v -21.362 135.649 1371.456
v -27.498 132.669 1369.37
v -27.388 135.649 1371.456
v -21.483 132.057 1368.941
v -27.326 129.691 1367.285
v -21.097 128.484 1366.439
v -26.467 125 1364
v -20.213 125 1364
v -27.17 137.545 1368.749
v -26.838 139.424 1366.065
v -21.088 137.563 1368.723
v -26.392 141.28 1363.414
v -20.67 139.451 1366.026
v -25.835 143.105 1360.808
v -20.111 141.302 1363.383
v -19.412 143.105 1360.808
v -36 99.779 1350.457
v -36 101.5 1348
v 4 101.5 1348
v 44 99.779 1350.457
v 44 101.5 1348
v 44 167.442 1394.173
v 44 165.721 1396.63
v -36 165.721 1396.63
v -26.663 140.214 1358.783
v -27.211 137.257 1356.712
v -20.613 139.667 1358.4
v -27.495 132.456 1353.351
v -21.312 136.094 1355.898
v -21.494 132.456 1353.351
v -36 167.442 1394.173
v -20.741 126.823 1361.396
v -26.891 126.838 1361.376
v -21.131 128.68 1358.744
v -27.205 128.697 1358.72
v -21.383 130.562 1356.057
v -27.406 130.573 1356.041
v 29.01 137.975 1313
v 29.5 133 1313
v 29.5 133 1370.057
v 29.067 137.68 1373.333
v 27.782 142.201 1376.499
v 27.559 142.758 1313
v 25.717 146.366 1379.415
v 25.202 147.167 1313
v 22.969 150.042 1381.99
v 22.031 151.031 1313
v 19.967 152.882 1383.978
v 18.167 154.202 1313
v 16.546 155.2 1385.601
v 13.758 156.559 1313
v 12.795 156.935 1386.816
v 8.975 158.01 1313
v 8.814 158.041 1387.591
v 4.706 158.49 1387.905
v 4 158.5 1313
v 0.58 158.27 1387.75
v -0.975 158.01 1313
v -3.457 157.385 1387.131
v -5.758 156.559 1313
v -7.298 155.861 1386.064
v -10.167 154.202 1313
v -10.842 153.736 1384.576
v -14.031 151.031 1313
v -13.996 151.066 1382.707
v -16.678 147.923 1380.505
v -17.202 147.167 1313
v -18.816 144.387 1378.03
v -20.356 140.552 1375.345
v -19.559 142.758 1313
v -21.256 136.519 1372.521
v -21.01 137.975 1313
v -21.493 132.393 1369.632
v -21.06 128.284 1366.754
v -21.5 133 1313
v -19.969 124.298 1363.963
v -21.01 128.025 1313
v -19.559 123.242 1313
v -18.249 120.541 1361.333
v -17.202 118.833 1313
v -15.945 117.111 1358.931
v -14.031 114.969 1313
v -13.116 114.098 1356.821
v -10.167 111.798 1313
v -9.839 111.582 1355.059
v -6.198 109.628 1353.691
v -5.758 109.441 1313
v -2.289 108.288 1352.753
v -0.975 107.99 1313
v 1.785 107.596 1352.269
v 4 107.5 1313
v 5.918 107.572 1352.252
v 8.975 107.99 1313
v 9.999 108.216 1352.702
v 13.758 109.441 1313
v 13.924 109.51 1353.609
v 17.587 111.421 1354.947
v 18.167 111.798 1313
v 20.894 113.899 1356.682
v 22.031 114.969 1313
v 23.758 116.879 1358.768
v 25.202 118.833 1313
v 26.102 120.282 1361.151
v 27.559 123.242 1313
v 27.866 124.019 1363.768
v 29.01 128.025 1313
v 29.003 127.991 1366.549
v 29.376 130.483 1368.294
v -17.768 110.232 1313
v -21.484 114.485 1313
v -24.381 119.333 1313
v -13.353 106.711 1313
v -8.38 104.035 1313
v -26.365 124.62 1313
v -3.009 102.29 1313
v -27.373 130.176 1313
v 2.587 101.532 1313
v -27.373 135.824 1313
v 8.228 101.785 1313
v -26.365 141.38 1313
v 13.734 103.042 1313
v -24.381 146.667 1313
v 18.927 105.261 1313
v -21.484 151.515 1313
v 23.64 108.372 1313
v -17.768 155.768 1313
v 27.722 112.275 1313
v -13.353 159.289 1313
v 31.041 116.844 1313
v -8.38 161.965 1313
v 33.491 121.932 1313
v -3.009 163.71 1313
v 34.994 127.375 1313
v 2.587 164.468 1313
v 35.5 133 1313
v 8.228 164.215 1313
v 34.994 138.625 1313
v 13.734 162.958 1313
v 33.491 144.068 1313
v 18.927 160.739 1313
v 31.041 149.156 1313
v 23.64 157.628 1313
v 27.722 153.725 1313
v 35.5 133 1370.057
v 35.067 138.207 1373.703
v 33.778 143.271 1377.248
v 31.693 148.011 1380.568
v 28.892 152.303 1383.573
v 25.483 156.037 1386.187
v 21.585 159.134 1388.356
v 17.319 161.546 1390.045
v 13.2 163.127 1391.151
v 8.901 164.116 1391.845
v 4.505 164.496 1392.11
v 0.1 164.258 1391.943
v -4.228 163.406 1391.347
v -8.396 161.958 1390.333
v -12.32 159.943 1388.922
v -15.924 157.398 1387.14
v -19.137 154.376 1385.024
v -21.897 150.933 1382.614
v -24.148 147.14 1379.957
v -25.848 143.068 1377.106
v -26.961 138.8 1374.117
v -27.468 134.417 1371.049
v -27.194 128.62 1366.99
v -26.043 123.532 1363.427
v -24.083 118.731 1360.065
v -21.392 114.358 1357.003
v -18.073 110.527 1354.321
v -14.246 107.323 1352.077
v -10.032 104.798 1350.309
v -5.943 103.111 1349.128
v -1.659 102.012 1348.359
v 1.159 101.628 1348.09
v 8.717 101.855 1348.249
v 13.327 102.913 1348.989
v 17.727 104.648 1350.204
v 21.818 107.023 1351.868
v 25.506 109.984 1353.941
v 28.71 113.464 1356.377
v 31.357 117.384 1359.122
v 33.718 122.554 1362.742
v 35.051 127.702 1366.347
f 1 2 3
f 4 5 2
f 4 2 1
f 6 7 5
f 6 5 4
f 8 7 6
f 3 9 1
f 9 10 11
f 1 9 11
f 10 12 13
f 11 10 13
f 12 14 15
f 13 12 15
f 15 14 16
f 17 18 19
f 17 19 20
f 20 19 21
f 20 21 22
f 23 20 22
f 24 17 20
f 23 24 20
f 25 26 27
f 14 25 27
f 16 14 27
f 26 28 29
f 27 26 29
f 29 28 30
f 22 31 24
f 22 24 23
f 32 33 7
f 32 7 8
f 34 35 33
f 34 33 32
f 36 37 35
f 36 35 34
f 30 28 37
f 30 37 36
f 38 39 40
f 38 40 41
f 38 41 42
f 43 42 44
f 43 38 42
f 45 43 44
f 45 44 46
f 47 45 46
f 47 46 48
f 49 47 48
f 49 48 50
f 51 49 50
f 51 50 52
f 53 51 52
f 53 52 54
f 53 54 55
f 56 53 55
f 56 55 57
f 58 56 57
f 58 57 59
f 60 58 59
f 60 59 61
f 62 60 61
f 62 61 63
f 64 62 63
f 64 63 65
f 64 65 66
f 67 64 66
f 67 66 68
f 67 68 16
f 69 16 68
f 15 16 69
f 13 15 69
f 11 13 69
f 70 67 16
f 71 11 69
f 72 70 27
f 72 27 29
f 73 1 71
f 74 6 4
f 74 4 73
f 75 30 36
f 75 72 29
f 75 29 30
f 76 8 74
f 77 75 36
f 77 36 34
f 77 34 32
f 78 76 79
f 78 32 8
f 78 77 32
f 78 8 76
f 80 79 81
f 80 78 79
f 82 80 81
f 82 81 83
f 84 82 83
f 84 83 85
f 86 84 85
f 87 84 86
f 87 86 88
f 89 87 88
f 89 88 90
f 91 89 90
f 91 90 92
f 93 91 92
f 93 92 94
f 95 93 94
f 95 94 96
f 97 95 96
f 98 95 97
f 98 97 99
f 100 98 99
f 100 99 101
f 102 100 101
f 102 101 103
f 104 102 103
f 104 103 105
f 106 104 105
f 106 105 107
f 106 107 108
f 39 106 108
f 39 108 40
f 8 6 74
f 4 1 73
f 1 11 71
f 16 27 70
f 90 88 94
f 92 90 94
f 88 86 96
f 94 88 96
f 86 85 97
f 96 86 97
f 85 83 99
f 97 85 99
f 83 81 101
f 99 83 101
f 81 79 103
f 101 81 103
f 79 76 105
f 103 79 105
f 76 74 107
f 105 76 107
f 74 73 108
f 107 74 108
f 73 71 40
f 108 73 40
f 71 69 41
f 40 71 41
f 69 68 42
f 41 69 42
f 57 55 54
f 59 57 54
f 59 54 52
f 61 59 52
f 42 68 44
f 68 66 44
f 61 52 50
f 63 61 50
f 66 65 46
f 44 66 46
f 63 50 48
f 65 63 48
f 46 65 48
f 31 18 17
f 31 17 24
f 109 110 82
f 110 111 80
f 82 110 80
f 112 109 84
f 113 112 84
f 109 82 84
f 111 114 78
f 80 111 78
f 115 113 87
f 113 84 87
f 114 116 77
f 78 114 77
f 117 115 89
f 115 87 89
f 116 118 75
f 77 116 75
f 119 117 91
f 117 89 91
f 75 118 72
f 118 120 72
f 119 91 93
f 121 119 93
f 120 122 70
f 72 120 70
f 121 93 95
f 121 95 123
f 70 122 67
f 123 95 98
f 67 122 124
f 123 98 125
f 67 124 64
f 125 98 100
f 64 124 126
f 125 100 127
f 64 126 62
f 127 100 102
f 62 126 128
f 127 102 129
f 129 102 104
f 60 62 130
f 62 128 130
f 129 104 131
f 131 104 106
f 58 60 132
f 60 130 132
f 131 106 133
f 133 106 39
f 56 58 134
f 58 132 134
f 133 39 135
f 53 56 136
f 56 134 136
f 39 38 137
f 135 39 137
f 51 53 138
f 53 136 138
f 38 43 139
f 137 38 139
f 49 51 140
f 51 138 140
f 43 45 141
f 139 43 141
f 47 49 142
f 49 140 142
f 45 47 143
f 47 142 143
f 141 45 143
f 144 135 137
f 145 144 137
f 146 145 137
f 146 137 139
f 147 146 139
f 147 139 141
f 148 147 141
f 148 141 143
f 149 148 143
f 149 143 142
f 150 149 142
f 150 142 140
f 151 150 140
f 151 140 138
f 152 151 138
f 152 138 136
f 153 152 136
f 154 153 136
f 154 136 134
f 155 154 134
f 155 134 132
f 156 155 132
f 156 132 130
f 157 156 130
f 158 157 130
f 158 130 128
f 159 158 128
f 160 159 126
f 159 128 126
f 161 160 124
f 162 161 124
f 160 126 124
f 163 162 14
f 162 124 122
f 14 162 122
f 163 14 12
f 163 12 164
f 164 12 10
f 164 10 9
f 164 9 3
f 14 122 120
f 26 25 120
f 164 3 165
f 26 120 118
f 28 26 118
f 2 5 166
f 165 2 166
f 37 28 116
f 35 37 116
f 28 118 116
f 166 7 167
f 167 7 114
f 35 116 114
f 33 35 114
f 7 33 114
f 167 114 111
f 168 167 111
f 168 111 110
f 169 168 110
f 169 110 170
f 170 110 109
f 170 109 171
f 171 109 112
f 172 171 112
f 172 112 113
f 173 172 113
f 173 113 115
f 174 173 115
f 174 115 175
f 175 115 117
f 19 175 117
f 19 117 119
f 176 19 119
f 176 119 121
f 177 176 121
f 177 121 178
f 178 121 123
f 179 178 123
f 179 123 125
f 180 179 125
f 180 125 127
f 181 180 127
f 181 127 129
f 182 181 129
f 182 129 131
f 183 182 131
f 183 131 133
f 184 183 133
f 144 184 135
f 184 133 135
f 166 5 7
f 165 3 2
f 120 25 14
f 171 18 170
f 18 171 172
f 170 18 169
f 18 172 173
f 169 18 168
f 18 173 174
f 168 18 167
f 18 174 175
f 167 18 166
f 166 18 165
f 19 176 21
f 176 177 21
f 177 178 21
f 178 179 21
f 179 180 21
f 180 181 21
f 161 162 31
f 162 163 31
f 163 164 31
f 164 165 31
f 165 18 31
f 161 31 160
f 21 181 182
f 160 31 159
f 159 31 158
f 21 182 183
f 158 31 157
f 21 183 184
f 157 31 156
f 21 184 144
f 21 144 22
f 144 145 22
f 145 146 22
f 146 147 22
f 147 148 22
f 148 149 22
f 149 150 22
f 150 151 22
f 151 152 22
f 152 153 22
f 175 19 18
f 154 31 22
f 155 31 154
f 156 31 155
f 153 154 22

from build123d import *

# Parameters (mm, degrees)
BOX059_W               = 30
BOX059_H               = 13
BOX059_DEPTH           = 13
BOX059_PLACEMENT_ANGLE = 55
BOX057_W               = 90
BOX057_H               = 40
BOX057_DEPTH           = 90
BOX057_PLACEMENT_ANGLE = 55
CYLINDER032_R          = 25.5
CYLINDER032_DEPTH      = 80
CYLINDER033_R          = 31.5
CYLINDER033_DEPTH      = 80
BOX058_W               = 80
BOX058_H               = 80.5
BOX058_DEPTH           = 3
BOX058_ROLL_ANGLE      = 35


with BuildPart() as usb_hole:
    # Box059 → Box059 (new body)
    with BuildSketch(Plane.XY):
        with Locations((15, 6.5)):
            Rectangle(BOX059_W, BOX059_H)
    extrude(amount=BOX059_DEPTH)


with BuildPart() as usb_hole_1:
    # Box059 placement: moved
    add(usb_hole.part.moved(Location((3, 51, 16))).rotate(Axis((3, 51, 16), (-1, 0, 0)), BOX059_PLACEMENT_ANGLE))


with BuildPart() as cube012:
    # Box057 → Box057 (new body)
    with BuildSketch(Plane.XY):
        with Locations((45, 20)):
            Rectangle(BOX057_W, BOX057_H)
    extrude(amount=BOX057_DEPTH)


with BuildPart() as cube012_1:
    # Box057 placement: moved
    add(cube012.part.moved(Location((0, -12, 68))).rotate(Axis((0, -12, 68), (-1, 0, 0)), BOX057_PLACEMENT_ANGLE))


with BuildPart() as cylinder017:
    # Cylinder032 → Cylinder032 (new body)
    with BuildSketch(Plane(origin=(41, 43, 0), x_dir=(1, 0, 0), z_dir=(0, 0, 1))):
        Circle(CYLINDER032_R)
    extrude(amount=CYLINDER032_DEPTH)


with BuildPart() as cut061:
    # Cylinder033 → Cylinder033 (new body)
    with BuildSketch(Plane(origin=(41, 43, 0), x_dir=(1, 0, 0), z_dir=(0, 0, 1))):
        Circle(CYLINDER033_R)
    extrude(amount=CYLINDER033_DEPTH)

    # Cut060: cut Cylinder017
    add(cylinder017.part, mode=Mode.SUBTRACT)

    # Cut061: cut Cube012
    add(cube012_1.part, mode=Mode.SUBTRACT)


with BuildPart() as cut061_1:
    # Cut061 placement: moved
    add(cut061.part.moved(Location((0, 16, -35))))


with BuildPart() as tube_to_tablet_piece:
    # Box058 → Box058 (new body)
    with BuildSketch(Plane.XY):
        with Locations((40, 40.25)):
            Rectangle(BOX058_W, BOX058_H)
    extrude(amount=BOX058_DEPTH)


with BuildPart() as tube_to_tablet_piece_1:
    # Box058 roll: moved
    add(tube_to_tablet_piece.part.rotate(Axis((0, 0, 0), (1, 0, 0)), BOX058_ROLL_ANGLE))


with BuildPart() as tube_to_tablet_piece_2:
    # Box058 placement: moved
    add(tube_to_tablet_piece_1.part.moved(Location((1, 27.5, 0))))

    # Fusion101: union Cut061
    add(cut061_1.part)

    # Cut062: cut USB hole
    add(usb_hole_1.part, mode=Mode.SUBTRACT)


with BuildPart() as tube_to_tablet_piece_3:
    # Cut062 placement: moved
    add(tube_to_tablet_piece_2.part.moved(Location((-37, 74, 1348))))


solid = tube_to_tablet_piece_3.part
